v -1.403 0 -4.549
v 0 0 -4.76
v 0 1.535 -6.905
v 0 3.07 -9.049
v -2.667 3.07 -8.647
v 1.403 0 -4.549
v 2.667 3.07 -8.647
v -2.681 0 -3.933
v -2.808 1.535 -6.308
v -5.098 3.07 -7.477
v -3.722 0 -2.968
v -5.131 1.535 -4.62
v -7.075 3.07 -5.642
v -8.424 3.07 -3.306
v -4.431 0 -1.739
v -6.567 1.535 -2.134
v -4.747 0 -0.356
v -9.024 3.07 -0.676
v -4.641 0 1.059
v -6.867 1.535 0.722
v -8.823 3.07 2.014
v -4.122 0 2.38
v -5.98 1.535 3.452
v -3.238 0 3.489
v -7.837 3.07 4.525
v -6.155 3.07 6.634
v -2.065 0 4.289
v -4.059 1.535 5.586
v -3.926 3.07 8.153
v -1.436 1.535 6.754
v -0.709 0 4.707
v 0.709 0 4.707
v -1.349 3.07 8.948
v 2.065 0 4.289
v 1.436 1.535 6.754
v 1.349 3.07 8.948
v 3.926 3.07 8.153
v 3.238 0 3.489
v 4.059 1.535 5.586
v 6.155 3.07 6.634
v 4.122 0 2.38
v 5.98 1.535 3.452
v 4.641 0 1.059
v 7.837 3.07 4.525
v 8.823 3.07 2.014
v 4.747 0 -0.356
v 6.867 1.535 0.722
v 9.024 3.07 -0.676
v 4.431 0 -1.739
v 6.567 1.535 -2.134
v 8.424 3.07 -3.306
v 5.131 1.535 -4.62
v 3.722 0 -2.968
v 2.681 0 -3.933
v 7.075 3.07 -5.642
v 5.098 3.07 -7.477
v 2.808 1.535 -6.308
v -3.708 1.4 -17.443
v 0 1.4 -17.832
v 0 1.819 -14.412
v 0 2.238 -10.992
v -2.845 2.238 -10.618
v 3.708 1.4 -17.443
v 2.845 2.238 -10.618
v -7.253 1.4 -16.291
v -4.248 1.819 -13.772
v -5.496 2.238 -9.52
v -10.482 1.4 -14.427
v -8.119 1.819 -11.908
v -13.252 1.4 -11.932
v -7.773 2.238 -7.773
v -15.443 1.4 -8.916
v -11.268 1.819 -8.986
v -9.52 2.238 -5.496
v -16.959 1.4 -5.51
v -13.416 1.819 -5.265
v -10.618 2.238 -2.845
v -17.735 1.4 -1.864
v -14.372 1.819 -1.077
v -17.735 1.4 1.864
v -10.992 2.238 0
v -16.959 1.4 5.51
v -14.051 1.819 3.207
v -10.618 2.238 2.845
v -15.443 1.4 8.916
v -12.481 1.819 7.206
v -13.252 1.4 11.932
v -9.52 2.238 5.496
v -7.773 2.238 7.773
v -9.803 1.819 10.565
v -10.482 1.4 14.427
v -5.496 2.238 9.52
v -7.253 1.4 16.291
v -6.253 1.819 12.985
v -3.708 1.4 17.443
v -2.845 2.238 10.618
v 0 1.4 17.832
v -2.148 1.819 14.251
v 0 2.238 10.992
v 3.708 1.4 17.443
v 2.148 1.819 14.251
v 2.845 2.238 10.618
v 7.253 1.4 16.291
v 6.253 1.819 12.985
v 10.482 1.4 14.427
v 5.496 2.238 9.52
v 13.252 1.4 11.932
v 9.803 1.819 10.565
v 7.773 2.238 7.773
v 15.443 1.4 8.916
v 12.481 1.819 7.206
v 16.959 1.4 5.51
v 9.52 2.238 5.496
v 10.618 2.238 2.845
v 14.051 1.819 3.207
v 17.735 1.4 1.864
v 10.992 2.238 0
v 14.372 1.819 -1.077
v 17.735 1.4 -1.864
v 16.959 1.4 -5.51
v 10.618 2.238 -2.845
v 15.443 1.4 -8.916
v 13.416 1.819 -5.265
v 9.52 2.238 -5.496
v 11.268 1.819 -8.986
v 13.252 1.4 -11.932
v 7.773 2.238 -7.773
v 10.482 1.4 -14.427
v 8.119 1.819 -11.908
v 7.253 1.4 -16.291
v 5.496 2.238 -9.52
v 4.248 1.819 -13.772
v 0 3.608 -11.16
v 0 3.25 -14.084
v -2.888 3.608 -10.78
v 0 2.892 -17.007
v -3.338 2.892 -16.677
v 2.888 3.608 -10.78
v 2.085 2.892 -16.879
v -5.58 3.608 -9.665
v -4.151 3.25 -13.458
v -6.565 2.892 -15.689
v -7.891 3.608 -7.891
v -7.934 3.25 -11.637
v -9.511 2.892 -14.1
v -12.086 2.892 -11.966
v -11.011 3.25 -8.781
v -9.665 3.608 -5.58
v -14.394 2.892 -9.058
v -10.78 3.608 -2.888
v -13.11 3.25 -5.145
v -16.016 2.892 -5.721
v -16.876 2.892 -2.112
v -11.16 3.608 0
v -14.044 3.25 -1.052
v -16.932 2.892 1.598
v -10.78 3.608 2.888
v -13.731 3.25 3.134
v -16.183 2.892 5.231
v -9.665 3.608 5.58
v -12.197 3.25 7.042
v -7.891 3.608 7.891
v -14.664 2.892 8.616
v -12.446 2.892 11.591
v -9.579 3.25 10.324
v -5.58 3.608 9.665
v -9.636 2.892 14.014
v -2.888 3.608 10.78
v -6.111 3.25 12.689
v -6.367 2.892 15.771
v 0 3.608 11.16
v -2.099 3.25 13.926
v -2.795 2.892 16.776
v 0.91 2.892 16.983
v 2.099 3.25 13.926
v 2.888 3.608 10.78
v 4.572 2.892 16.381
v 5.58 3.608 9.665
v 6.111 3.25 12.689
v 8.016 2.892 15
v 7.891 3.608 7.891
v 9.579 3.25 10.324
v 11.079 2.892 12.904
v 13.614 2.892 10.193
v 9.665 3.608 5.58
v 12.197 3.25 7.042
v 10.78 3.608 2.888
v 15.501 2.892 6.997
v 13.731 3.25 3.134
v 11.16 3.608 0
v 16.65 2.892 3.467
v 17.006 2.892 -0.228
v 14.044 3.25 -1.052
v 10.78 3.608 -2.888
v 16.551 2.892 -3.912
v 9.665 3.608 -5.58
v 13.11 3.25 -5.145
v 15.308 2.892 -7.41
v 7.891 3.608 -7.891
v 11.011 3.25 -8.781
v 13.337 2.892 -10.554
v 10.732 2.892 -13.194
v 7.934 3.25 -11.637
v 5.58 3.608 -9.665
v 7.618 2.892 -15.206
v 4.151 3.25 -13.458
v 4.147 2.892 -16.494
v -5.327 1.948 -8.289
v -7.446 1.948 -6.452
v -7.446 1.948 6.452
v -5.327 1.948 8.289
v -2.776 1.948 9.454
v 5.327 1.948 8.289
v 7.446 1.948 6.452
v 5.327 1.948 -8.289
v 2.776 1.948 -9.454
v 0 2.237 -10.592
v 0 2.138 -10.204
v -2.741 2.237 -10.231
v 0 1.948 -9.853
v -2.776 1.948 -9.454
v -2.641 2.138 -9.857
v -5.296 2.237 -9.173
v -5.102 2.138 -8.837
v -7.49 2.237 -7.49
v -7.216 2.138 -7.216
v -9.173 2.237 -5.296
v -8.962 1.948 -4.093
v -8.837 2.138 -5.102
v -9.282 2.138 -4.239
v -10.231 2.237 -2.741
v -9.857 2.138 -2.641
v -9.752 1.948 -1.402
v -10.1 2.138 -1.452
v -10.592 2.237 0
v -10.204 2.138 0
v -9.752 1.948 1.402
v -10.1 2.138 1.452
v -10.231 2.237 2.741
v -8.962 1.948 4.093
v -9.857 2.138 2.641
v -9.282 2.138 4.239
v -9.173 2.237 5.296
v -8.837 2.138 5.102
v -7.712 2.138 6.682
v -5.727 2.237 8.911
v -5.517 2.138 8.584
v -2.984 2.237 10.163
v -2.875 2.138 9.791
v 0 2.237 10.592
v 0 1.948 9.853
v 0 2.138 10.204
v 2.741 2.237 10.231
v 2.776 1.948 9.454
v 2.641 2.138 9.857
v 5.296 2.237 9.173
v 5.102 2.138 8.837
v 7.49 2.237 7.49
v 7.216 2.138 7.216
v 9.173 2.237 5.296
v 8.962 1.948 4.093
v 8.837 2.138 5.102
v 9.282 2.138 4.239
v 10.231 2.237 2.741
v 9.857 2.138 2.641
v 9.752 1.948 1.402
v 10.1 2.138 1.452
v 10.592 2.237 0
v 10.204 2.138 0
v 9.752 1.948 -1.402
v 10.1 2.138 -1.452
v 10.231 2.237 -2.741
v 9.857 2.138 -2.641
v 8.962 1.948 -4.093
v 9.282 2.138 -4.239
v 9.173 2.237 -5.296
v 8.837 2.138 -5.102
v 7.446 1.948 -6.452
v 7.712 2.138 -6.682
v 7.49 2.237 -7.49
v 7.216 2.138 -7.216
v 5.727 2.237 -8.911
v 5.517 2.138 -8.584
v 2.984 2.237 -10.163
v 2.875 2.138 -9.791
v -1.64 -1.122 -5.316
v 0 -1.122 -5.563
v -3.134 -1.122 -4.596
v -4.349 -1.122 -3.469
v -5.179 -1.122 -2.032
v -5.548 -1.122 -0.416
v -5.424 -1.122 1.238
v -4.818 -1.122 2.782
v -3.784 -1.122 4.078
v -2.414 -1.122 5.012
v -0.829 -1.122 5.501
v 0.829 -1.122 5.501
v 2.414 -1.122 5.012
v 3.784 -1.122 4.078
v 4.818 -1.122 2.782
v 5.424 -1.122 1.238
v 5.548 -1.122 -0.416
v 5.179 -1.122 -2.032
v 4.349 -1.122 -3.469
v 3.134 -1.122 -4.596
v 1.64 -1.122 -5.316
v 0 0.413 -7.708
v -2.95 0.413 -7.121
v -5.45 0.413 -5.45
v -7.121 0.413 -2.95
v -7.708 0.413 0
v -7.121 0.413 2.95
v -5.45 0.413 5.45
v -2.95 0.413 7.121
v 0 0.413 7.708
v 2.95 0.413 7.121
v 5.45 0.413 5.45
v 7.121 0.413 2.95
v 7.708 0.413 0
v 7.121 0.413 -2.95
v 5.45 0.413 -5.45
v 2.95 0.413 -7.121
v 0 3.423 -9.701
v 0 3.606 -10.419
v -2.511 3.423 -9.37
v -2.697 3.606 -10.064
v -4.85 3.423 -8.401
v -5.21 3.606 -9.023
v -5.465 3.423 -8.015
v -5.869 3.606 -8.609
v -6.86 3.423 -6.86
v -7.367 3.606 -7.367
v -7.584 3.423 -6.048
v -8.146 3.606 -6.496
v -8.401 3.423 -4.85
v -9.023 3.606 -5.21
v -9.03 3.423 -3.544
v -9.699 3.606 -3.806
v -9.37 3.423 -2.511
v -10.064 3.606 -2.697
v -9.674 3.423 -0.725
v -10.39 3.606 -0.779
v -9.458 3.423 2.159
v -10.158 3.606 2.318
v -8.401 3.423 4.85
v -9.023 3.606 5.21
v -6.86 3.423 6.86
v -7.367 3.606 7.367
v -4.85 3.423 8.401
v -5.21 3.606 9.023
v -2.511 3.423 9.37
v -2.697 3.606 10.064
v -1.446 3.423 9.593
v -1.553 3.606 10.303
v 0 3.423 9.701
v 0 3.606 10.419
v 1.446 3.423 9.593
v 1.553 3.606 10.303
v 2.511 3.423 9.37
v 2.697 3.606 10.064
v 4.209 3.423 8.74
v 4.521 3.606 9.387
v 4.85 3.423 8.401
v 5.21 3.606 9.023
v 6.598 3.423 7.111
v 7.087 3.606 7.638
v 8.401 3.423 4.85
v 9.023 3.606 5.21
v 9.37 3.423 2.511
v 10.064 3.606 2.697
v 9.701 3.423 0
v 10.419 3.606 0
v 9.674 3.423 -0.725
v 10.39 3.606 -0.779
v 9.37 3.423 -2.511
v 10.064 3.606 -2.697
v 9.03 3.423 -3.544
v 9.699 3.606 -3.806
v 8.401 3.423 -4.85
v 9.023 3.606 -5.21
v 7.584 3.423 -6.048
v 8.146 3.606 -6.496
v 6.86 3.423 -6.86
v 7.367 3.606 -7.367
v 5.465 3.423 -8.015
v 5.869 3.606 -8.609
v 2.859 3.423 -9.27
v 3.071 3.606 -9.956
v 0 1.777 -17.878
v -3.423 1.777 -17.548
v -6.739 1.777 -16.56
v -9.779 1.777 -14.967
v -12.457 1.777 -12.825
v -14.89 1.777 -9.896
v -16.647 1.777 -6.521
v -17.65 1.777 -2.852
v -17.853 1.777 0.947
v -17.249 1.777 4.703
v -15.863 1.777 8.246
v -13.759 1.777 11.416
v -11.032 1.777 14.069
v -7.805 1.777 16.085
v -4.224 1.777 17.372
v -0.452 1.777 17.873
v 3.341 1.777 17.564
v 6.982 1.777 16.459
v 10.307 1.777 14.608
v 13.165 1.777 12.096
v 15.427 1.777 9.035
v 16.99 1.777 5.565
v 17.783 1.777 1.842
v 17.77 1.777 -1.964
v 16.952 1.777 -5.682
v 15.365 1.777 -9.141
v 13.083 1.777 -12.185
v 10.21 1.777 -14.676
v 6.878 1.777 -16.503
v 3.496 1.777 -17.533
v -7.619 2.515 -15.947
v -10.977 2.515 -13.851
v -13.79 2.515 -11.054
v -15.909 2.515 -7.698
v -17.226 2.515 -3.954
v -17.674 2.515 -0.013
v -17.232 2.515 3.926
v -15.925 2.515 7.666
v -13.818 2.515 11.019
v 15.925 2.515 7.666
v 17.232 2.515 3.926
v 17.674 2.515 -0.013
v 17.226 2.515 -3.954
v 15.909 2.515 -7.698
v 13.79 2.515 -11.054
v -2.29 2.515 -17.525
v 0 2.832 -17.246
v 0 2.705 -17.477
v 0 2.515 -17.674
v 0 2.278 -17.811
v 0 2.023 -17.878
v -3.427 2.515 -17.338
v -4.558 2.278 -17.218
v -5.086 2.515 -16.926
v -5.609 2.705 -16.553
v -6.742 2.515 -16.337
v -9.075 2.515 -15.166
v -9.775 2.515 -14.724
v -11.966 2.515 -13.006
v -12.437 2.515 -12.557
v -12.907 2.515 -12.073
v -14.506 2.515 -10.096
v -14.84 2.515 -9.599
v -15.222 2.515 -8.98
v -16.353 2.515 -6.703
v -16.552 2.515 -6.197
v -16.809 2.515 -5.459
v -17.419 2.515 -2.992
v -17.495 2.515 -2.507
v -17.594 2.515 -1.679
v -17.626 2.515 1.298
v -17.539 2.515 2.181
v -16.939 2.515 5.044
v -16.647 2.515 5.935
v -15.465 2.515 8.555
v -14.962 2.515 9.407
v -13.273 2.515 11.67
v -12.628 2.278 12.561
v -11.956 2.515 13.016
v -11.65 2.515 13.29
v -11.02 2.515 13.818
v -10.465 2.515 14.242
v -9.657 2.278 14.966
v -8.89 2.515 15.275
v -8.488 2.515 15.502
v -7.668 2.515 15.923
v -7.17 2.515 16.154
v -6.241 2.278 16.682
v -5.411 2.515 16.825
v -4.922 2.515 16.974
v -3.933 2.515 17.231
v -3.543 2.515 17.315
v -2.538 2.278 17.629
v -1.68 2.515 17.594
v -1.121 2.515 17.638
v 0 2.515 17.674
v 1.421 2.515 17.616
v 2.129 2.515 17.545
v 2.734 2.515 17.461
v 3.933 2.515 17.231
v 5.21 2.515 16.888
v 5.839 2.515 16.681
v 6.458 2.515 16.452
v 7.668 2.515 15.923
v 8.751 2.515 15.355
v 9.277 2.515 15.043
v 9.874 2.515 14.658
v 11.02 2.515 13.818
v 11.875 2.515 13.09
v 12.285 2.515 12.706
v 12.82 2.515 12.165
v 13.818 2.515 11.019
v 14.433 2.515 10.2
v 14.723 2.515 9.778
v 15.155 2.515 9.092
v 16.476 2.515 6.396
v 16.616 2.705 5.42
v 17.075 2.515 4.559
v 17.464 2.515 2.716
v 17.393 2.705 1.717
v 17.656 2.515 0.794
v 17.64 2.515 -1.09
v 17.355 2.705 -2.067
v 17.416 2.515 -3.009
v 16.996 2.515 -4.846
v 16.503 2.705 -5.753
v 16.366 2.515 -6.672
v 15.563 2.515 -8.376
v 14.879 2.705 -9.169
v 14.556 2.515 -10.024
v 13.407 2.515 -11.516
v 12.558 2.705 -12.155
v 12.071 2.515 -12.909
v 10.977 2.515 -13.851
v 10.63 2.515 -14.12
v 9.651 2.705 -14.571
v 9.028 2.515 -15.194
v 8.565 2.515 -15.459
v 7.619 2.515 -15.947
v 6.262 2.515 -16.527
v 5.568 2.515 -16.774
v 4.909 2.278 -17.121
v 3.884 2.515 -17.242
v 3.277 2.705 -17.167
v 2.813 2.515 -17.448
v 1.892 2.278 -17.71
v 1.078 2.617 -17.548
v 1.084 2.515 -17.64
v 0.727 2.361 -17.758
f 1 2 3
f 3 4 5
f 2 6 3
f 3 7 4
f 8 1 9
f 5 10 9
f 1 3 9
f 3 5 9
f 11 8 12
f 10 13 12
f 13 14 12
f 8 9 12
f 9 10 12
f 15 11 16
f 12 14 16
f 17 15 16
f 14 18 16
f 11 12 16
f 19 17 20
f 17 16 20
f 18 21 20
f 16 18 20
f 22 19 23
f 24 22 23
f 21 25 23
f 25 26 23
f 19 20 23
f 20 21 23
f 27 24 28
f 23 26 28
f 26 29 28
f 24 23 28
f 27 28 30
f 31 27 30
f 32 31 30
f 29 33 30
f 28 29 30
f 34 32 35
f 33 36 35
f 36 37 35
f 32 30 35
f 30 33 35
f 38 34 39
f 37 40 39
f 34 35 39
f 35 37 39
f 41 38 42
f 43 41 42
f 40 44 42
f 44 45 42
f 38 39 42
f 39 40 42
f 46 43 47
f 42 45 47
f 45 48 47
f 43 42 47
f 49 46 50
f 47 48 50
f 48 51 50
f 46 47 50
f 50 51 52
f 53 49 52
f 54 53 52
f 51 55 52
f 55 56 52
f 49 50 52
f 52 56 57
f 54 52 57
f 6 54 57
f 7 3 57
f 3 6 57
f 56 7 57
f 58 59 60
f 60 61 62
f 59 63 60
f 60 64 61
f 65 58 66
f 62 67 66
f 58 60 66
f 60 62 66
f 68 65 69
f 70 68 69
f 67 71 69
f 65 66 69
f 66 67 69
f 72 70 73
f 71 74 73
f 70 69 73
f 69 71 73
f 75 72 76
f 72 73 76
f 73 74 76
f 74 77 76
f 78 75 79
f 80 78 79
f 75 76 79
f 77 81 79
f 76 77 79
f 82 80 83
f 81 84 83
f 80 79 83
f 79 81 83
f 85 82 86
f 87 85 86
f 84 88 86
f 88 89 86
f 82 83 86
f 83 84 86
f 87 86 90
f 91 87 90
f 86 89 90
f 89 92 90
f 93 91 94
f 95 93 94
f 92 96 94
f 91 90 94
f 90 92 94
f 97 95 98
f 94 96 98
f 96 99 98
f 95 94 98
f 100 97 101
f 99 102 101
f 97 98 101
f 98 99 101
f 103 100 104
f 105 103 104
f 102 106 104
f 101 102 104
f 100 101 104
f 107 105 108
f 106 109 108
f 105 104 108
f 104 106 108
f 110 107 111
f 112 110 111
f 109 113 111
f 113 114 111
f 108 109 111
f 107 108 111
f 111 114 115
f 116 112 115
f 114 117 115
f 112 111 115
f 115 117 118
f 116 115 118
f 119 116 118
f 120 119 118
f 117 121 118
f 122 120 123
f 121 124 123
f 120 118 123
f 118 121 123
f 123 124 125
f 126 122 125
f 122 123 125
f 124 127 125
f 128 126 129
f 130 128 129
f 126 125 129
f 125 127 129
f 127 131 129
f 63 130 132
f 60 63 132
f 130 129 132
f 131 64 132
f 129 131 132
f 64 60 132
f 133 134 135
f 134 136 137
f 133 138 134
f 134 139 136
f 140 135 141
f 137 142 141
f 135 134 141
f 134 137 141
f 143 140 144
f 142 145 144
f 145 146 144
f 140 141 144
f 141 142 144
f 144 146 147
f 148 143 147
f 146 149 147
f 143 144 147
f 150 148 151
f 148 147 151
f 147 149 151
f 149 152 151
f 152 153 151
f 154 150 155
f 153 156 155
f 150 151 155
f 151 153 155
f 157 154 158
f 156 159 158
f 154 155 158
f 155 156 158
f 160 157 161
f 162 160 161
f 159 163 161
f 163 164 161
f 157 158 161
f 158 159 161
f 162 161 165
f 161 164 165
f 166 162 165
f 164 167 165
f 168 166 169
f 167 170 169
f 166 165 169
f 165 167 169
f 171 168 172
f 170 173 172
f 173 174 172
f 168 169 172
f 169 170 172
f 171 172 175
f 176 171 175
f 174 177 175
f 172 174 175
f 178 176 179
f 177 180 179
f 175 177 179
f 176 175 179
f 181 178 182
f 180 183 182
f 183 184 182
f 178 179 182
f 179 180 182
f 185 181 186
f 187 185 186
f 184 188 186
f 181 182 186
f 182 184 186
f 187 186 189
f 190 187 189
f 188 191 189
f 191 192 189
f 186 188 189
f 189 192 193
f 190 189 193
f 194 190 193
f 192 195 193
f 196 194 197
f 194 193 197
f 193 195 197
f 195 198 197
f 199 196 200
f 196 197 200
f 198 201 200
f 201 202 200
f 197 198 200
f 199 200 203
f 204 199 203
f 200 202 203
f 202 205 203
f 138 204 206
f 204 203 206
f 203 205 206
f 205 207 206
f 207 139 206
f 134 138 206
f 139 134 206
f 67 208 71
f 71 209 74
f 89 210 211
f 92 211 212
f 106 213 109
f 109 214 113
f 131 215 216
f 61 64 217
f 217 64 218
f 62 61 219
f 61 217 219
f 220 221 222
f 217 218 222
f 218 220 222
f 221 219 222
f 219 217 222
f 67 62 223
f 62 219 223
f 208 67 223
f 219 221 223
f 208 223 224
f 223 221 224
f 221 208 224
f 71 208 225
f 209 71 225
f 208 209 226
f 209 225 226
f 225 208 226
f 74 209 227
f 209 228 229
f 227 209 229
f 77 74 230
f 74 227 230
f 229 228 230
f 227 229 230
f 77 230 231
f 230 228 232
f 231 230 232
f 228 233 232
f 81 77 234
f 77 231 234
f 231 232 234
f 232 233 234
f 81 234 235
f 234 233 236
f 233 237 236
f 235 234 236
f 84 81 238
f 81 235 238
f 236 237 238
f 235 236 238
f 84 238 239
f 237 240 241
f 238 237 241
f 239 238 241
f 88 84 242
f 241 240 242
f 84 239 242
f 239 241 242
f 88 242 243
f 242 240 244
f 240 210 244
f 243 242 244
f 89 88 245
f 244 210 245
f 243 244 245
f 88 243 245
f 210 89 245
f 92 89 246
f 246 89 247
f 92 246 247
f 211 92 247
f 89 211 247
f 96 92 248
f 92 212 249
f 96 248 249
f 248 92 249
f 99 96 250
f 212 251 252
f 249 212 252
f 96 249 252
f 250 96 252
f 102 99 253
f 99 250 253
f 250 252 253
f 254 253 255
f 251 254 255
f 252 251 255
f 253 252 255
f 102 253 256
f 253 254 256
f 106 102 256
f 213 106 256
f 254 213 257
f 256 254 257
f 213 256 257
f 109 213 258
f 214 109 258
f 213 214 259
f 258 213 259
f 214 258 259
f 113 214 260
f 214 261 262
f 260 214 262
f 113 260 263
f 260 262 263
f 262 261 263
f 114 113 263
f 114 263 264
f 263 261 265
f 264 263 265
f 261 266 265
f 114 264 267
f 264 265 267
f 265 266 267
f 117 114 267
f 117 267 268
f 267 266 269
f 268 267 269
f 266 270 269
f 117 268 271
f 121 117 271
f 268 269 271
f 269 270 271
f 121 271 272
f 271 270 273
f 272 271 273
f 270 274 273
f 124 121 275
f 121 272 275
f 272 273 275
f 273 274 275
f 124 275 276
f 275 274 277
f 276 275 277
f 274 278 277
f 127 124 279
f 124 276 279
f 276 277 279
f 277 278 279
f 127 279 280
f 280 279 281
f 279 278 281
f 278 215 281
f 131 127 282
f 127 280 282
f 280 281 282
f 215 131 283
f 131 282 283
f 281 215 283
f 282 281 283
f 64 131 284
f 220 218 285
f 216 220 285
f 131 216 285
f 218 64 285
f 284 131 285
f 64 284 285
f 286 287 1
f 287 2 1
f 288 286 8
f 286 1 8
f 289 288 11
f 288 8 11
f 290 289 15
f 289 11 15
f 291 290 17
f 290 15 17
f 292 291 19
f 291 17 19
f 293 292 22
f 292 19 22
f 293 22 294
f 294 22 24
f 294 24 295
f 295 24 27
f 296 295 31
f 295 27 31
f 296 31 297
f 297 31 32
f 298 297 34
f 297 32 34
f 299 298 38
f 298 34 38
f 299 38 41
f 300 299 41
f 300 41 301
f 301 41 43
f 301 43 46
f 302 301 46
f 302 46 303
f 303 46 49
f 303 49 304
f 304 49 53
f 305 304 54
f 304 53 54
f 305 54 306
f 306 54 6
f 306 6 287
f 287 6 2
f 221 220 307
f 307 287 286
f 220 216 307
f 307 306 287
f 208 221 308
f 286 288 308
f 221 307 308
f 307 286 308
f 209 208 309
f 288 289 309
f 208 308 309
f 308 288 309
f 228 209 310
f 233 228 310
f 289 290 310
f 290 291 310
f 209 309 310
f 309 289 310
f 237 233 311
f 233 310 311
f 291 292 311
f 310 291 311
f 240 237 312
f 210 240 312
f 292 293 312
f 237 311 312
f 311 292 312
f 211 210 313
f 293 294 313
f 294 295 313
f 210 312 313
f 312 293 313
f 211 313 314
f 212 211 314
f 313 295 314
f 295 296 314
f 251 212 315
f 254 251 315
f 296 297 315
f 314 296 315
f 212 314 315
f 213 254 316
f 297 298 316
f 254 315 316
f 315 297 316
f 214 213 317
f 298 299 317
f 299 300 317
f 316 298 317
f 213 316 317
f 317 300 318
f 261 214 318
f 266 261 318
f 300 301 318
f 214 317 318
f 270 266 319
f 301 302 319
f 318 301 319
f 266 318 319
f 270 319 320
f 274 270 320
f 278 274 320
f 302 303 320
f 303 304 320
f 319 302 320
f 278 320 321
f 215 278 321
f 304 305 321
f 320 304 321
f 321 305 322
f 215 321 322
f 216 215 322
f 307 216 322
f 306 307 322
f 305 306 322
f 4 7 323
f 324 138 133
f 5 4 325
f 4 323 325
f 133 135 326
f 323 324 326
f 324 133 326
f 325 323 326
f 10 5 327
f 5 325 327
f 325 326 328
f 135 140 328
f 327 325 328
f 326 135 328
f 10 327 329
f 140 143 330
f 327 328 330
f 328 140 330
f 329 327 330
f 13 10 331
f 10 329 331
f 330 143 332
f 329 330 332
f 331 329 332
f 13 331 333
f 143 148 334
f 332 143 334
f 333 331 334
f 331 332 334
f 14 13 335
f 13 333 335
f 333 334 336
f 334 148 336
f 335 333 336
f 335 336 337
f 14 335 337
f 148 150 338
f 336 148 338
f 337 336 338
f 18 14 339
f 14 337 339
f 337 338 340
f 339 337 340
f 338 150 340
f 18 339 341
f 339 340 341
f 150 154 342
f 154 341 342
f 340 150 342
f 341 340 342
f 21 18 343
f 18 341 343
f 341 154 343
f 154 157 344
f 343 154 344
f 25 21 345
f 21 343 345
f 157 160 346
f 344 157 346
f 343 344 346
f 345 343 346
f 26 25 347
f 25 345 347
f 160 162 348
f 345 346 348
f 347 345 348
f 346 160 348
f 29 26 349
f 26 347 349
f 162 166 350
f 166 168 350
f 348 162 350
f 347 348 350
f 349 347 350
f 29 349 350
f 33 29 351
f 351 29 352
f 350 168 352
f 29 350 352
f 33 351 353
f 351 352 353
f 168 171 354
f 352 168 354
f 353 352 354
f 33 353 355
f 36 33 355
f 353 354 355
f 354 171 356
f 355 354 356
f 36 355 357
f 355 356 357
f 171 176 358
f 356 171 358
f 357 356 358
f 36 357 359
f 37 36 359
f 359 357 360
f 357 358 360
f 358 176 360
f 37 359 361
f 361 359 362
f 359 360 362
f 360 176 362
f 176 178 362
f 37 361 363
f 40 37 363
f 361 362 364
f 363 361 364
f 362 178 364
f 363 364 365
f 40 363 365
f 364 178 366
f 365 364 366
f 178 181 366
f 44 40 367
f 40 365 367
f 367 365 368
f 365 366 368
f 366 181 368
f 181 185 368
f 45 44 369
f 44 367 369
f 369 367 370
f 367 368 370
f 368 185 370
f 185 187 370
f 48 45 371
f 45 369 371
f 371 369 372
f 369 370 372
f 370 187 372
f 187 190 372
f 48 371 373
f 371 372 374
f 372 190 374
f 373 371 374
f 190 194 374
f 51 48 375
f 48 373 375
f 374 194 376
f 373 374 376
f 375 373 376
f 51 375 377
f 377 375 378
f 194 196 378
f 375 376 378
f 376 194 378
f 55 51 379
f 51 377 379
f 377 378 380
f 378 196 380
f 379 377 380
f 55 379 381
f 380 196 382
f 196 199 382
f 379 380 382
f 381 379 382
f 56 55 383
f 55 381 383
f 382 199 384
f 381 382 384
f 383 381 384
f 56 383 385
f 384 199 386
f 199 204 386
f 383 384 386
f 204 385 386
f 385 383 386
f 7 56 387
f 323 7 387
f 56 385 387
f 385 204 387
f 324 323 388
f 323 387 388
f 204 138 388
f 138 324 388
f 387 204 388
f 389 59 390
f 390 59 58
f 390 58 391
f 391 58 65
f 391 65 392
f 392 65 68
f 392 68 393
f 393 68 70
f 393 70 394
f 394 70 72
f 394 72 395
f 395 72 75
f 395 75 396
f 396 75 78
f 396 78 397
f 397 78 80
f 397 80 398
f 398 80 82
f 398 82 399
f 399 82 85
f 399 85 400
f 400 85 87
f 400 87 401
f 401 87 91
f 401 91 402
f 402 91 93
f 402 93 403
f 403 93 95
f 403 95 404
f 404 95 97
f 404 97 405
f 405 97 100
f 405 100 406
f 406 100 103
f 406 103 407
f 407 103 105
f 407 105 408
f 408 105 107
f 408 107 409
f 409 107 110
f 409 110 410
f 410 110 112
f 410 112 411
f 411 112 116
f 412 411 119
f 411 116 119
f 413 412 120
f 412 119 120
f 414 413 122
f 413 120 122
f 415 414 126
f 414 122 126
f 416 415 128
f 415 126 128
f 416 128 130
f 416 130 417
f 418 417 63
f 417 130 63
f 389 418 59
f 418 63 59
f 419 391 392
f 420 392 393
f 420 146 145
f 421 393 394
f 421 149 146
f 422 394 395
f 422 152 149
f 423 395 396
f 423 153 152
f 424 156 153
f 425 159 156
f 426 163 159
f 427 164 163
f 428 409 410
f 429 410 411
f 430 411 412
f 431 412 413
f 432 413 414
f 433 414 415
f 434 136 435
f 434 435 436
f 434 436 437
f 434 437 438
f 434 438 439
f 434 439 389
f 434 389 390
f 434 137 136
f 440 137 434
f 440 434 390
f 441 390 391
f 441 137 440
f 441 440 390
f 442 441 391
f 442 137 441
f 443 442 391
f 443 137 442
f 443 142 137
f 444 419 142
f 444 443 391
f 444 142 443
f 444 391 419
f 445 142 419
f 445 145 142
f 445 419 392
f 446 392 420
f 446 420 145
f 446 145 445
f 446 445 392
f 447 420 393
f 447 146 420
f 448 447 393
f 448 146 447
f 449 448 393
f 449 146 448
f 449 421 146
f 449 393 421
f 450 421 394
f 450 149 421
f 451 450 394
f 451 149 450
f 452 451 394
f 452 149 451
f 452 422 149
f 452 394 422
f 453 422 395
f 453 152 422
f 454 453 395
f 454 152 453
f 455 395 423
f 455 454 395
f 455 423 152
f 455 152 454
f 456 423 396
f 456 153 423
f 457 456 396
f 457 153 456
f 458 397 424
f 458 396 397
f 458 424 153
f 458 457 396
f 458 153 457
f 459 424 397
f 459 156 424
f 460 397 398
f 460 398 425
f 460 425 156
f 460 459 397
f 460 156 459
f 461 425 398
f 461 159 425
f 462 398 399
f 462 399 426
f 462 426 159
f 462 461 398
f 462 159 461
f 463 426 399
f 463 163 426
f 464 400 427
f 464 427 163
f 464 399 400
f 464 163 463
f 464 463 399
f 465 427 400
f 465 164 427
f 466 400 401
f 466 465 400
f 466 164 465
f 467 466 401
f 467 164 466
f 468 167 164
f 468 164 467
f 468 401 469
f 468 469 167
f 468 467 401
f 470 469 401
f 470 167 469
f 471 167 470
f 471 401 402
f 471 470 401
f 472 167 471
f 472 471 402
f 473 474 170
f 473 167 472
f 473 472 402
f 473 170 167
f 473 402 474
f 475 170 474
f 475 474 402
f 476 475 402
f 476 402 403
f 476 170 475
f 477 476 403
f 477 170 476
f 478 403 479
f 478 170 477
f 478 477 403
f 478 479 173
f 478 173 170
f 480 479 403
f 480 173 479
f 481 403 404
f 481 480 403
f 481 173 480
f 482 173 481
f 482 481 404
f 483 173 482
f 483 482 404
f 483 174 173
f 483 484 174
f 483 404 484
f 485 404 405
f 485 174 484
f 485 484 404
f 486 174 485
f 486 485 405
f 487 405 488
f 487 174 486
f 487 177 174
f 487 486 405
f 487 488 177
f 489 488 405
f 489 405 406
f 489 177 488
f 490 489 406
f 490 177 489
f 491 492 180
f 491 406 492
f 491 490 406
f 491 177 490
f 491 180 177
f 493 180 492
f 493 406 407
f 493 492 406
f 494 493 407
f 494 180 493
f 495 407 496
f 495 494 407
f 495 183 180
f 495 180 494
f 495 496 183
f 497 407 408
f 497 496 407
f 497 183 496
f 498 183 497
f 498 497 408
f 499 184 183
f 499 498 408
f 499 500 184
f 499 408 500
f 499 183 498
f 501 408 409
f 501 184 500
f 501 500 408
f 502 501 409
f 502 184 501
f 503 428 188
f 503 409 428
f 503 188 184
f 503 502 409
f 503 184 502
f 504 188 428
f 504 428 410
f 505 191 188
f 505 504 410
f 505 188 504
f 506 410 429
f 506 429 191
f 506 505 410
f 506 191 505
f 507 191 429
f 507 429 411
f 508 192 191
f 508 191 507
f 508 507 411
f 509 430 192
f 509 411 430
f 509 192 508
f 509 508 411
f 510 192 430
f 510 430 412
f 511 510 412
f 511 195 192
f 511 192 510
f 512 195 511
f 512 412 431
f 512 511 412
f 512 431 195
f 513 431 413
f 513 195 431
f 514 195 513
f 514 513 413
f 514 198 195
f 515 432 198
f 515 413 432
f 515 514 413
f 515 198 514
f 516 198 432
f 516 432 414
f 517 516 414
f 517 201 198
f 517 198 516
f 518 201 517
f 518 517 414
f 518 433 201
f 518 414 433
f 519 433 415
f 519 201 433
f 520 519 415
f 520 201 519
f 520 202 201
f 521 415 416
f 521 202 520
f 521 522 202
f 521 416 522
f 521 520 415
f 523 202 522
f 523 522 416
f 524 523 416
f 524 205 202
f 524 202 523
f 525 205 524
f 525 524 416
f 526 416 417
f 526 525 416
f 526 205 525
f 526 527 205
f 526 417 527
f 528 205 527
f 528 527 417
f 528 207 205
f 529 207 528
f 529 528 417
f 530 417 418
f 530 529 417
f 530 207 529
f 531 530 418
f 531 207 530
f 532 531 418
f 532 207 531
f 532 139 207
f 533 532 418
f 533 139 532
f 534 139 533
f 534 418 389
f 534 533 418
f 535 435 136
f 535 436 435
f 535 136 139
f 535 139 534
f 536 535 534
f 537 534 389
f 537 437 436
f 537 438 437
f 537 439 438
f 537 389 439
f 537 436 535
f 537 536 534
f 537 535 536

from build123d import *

# Parameters (mm, degrees)
FILLET1_R = 1


with BuildPart() as part:
    # Sketch1 → Revolve-Thin2 (revolve)
    with BuildSketch(Plane.XY, mode=Mode.PRIVATE) as revolve_thin2_sk:
        with BuildLine():
            Line((4.76, 0), (9.049484193, 3.069764451))
            ThreePointArc((9.049484193, 3.069764451), (10.0542655, 3.537150049), (11.160173373, 3.607878762))
            Line((11.160173373, 3.607878762), (18, 2.77))
            Line((18, 2.77), (17.832204304, 1.400239216))
            Line((17.832204304, 1.400239216), (10.992377677, 2.238117978))
            ThreePointArc((10.992377677, 2.238117978), (10.395187426, 2.199924473), (9.85260552, 1.94753625))
            Line((9.85260552, 1.94753625), (5.563121327, -1.122228201))
            Line((5.563121327, -1.122228201), (4.76, 0))
        make_face()
    revolve(revolve_thin2_sk.sketch.rotate(Axis((0, 0, 0), (0, 1, 0)), 90), axis=Axis((0, 0, 0), (0, 1, 0)))

    # Fillet1
    fillet1_edges = [part.edges().sort_by_distance(p)[0] for p in [
        (0, 2.77, 18),
    ]]
    fillet(fillet1_edges, radius=FILLET1_R)


solid = part.part
